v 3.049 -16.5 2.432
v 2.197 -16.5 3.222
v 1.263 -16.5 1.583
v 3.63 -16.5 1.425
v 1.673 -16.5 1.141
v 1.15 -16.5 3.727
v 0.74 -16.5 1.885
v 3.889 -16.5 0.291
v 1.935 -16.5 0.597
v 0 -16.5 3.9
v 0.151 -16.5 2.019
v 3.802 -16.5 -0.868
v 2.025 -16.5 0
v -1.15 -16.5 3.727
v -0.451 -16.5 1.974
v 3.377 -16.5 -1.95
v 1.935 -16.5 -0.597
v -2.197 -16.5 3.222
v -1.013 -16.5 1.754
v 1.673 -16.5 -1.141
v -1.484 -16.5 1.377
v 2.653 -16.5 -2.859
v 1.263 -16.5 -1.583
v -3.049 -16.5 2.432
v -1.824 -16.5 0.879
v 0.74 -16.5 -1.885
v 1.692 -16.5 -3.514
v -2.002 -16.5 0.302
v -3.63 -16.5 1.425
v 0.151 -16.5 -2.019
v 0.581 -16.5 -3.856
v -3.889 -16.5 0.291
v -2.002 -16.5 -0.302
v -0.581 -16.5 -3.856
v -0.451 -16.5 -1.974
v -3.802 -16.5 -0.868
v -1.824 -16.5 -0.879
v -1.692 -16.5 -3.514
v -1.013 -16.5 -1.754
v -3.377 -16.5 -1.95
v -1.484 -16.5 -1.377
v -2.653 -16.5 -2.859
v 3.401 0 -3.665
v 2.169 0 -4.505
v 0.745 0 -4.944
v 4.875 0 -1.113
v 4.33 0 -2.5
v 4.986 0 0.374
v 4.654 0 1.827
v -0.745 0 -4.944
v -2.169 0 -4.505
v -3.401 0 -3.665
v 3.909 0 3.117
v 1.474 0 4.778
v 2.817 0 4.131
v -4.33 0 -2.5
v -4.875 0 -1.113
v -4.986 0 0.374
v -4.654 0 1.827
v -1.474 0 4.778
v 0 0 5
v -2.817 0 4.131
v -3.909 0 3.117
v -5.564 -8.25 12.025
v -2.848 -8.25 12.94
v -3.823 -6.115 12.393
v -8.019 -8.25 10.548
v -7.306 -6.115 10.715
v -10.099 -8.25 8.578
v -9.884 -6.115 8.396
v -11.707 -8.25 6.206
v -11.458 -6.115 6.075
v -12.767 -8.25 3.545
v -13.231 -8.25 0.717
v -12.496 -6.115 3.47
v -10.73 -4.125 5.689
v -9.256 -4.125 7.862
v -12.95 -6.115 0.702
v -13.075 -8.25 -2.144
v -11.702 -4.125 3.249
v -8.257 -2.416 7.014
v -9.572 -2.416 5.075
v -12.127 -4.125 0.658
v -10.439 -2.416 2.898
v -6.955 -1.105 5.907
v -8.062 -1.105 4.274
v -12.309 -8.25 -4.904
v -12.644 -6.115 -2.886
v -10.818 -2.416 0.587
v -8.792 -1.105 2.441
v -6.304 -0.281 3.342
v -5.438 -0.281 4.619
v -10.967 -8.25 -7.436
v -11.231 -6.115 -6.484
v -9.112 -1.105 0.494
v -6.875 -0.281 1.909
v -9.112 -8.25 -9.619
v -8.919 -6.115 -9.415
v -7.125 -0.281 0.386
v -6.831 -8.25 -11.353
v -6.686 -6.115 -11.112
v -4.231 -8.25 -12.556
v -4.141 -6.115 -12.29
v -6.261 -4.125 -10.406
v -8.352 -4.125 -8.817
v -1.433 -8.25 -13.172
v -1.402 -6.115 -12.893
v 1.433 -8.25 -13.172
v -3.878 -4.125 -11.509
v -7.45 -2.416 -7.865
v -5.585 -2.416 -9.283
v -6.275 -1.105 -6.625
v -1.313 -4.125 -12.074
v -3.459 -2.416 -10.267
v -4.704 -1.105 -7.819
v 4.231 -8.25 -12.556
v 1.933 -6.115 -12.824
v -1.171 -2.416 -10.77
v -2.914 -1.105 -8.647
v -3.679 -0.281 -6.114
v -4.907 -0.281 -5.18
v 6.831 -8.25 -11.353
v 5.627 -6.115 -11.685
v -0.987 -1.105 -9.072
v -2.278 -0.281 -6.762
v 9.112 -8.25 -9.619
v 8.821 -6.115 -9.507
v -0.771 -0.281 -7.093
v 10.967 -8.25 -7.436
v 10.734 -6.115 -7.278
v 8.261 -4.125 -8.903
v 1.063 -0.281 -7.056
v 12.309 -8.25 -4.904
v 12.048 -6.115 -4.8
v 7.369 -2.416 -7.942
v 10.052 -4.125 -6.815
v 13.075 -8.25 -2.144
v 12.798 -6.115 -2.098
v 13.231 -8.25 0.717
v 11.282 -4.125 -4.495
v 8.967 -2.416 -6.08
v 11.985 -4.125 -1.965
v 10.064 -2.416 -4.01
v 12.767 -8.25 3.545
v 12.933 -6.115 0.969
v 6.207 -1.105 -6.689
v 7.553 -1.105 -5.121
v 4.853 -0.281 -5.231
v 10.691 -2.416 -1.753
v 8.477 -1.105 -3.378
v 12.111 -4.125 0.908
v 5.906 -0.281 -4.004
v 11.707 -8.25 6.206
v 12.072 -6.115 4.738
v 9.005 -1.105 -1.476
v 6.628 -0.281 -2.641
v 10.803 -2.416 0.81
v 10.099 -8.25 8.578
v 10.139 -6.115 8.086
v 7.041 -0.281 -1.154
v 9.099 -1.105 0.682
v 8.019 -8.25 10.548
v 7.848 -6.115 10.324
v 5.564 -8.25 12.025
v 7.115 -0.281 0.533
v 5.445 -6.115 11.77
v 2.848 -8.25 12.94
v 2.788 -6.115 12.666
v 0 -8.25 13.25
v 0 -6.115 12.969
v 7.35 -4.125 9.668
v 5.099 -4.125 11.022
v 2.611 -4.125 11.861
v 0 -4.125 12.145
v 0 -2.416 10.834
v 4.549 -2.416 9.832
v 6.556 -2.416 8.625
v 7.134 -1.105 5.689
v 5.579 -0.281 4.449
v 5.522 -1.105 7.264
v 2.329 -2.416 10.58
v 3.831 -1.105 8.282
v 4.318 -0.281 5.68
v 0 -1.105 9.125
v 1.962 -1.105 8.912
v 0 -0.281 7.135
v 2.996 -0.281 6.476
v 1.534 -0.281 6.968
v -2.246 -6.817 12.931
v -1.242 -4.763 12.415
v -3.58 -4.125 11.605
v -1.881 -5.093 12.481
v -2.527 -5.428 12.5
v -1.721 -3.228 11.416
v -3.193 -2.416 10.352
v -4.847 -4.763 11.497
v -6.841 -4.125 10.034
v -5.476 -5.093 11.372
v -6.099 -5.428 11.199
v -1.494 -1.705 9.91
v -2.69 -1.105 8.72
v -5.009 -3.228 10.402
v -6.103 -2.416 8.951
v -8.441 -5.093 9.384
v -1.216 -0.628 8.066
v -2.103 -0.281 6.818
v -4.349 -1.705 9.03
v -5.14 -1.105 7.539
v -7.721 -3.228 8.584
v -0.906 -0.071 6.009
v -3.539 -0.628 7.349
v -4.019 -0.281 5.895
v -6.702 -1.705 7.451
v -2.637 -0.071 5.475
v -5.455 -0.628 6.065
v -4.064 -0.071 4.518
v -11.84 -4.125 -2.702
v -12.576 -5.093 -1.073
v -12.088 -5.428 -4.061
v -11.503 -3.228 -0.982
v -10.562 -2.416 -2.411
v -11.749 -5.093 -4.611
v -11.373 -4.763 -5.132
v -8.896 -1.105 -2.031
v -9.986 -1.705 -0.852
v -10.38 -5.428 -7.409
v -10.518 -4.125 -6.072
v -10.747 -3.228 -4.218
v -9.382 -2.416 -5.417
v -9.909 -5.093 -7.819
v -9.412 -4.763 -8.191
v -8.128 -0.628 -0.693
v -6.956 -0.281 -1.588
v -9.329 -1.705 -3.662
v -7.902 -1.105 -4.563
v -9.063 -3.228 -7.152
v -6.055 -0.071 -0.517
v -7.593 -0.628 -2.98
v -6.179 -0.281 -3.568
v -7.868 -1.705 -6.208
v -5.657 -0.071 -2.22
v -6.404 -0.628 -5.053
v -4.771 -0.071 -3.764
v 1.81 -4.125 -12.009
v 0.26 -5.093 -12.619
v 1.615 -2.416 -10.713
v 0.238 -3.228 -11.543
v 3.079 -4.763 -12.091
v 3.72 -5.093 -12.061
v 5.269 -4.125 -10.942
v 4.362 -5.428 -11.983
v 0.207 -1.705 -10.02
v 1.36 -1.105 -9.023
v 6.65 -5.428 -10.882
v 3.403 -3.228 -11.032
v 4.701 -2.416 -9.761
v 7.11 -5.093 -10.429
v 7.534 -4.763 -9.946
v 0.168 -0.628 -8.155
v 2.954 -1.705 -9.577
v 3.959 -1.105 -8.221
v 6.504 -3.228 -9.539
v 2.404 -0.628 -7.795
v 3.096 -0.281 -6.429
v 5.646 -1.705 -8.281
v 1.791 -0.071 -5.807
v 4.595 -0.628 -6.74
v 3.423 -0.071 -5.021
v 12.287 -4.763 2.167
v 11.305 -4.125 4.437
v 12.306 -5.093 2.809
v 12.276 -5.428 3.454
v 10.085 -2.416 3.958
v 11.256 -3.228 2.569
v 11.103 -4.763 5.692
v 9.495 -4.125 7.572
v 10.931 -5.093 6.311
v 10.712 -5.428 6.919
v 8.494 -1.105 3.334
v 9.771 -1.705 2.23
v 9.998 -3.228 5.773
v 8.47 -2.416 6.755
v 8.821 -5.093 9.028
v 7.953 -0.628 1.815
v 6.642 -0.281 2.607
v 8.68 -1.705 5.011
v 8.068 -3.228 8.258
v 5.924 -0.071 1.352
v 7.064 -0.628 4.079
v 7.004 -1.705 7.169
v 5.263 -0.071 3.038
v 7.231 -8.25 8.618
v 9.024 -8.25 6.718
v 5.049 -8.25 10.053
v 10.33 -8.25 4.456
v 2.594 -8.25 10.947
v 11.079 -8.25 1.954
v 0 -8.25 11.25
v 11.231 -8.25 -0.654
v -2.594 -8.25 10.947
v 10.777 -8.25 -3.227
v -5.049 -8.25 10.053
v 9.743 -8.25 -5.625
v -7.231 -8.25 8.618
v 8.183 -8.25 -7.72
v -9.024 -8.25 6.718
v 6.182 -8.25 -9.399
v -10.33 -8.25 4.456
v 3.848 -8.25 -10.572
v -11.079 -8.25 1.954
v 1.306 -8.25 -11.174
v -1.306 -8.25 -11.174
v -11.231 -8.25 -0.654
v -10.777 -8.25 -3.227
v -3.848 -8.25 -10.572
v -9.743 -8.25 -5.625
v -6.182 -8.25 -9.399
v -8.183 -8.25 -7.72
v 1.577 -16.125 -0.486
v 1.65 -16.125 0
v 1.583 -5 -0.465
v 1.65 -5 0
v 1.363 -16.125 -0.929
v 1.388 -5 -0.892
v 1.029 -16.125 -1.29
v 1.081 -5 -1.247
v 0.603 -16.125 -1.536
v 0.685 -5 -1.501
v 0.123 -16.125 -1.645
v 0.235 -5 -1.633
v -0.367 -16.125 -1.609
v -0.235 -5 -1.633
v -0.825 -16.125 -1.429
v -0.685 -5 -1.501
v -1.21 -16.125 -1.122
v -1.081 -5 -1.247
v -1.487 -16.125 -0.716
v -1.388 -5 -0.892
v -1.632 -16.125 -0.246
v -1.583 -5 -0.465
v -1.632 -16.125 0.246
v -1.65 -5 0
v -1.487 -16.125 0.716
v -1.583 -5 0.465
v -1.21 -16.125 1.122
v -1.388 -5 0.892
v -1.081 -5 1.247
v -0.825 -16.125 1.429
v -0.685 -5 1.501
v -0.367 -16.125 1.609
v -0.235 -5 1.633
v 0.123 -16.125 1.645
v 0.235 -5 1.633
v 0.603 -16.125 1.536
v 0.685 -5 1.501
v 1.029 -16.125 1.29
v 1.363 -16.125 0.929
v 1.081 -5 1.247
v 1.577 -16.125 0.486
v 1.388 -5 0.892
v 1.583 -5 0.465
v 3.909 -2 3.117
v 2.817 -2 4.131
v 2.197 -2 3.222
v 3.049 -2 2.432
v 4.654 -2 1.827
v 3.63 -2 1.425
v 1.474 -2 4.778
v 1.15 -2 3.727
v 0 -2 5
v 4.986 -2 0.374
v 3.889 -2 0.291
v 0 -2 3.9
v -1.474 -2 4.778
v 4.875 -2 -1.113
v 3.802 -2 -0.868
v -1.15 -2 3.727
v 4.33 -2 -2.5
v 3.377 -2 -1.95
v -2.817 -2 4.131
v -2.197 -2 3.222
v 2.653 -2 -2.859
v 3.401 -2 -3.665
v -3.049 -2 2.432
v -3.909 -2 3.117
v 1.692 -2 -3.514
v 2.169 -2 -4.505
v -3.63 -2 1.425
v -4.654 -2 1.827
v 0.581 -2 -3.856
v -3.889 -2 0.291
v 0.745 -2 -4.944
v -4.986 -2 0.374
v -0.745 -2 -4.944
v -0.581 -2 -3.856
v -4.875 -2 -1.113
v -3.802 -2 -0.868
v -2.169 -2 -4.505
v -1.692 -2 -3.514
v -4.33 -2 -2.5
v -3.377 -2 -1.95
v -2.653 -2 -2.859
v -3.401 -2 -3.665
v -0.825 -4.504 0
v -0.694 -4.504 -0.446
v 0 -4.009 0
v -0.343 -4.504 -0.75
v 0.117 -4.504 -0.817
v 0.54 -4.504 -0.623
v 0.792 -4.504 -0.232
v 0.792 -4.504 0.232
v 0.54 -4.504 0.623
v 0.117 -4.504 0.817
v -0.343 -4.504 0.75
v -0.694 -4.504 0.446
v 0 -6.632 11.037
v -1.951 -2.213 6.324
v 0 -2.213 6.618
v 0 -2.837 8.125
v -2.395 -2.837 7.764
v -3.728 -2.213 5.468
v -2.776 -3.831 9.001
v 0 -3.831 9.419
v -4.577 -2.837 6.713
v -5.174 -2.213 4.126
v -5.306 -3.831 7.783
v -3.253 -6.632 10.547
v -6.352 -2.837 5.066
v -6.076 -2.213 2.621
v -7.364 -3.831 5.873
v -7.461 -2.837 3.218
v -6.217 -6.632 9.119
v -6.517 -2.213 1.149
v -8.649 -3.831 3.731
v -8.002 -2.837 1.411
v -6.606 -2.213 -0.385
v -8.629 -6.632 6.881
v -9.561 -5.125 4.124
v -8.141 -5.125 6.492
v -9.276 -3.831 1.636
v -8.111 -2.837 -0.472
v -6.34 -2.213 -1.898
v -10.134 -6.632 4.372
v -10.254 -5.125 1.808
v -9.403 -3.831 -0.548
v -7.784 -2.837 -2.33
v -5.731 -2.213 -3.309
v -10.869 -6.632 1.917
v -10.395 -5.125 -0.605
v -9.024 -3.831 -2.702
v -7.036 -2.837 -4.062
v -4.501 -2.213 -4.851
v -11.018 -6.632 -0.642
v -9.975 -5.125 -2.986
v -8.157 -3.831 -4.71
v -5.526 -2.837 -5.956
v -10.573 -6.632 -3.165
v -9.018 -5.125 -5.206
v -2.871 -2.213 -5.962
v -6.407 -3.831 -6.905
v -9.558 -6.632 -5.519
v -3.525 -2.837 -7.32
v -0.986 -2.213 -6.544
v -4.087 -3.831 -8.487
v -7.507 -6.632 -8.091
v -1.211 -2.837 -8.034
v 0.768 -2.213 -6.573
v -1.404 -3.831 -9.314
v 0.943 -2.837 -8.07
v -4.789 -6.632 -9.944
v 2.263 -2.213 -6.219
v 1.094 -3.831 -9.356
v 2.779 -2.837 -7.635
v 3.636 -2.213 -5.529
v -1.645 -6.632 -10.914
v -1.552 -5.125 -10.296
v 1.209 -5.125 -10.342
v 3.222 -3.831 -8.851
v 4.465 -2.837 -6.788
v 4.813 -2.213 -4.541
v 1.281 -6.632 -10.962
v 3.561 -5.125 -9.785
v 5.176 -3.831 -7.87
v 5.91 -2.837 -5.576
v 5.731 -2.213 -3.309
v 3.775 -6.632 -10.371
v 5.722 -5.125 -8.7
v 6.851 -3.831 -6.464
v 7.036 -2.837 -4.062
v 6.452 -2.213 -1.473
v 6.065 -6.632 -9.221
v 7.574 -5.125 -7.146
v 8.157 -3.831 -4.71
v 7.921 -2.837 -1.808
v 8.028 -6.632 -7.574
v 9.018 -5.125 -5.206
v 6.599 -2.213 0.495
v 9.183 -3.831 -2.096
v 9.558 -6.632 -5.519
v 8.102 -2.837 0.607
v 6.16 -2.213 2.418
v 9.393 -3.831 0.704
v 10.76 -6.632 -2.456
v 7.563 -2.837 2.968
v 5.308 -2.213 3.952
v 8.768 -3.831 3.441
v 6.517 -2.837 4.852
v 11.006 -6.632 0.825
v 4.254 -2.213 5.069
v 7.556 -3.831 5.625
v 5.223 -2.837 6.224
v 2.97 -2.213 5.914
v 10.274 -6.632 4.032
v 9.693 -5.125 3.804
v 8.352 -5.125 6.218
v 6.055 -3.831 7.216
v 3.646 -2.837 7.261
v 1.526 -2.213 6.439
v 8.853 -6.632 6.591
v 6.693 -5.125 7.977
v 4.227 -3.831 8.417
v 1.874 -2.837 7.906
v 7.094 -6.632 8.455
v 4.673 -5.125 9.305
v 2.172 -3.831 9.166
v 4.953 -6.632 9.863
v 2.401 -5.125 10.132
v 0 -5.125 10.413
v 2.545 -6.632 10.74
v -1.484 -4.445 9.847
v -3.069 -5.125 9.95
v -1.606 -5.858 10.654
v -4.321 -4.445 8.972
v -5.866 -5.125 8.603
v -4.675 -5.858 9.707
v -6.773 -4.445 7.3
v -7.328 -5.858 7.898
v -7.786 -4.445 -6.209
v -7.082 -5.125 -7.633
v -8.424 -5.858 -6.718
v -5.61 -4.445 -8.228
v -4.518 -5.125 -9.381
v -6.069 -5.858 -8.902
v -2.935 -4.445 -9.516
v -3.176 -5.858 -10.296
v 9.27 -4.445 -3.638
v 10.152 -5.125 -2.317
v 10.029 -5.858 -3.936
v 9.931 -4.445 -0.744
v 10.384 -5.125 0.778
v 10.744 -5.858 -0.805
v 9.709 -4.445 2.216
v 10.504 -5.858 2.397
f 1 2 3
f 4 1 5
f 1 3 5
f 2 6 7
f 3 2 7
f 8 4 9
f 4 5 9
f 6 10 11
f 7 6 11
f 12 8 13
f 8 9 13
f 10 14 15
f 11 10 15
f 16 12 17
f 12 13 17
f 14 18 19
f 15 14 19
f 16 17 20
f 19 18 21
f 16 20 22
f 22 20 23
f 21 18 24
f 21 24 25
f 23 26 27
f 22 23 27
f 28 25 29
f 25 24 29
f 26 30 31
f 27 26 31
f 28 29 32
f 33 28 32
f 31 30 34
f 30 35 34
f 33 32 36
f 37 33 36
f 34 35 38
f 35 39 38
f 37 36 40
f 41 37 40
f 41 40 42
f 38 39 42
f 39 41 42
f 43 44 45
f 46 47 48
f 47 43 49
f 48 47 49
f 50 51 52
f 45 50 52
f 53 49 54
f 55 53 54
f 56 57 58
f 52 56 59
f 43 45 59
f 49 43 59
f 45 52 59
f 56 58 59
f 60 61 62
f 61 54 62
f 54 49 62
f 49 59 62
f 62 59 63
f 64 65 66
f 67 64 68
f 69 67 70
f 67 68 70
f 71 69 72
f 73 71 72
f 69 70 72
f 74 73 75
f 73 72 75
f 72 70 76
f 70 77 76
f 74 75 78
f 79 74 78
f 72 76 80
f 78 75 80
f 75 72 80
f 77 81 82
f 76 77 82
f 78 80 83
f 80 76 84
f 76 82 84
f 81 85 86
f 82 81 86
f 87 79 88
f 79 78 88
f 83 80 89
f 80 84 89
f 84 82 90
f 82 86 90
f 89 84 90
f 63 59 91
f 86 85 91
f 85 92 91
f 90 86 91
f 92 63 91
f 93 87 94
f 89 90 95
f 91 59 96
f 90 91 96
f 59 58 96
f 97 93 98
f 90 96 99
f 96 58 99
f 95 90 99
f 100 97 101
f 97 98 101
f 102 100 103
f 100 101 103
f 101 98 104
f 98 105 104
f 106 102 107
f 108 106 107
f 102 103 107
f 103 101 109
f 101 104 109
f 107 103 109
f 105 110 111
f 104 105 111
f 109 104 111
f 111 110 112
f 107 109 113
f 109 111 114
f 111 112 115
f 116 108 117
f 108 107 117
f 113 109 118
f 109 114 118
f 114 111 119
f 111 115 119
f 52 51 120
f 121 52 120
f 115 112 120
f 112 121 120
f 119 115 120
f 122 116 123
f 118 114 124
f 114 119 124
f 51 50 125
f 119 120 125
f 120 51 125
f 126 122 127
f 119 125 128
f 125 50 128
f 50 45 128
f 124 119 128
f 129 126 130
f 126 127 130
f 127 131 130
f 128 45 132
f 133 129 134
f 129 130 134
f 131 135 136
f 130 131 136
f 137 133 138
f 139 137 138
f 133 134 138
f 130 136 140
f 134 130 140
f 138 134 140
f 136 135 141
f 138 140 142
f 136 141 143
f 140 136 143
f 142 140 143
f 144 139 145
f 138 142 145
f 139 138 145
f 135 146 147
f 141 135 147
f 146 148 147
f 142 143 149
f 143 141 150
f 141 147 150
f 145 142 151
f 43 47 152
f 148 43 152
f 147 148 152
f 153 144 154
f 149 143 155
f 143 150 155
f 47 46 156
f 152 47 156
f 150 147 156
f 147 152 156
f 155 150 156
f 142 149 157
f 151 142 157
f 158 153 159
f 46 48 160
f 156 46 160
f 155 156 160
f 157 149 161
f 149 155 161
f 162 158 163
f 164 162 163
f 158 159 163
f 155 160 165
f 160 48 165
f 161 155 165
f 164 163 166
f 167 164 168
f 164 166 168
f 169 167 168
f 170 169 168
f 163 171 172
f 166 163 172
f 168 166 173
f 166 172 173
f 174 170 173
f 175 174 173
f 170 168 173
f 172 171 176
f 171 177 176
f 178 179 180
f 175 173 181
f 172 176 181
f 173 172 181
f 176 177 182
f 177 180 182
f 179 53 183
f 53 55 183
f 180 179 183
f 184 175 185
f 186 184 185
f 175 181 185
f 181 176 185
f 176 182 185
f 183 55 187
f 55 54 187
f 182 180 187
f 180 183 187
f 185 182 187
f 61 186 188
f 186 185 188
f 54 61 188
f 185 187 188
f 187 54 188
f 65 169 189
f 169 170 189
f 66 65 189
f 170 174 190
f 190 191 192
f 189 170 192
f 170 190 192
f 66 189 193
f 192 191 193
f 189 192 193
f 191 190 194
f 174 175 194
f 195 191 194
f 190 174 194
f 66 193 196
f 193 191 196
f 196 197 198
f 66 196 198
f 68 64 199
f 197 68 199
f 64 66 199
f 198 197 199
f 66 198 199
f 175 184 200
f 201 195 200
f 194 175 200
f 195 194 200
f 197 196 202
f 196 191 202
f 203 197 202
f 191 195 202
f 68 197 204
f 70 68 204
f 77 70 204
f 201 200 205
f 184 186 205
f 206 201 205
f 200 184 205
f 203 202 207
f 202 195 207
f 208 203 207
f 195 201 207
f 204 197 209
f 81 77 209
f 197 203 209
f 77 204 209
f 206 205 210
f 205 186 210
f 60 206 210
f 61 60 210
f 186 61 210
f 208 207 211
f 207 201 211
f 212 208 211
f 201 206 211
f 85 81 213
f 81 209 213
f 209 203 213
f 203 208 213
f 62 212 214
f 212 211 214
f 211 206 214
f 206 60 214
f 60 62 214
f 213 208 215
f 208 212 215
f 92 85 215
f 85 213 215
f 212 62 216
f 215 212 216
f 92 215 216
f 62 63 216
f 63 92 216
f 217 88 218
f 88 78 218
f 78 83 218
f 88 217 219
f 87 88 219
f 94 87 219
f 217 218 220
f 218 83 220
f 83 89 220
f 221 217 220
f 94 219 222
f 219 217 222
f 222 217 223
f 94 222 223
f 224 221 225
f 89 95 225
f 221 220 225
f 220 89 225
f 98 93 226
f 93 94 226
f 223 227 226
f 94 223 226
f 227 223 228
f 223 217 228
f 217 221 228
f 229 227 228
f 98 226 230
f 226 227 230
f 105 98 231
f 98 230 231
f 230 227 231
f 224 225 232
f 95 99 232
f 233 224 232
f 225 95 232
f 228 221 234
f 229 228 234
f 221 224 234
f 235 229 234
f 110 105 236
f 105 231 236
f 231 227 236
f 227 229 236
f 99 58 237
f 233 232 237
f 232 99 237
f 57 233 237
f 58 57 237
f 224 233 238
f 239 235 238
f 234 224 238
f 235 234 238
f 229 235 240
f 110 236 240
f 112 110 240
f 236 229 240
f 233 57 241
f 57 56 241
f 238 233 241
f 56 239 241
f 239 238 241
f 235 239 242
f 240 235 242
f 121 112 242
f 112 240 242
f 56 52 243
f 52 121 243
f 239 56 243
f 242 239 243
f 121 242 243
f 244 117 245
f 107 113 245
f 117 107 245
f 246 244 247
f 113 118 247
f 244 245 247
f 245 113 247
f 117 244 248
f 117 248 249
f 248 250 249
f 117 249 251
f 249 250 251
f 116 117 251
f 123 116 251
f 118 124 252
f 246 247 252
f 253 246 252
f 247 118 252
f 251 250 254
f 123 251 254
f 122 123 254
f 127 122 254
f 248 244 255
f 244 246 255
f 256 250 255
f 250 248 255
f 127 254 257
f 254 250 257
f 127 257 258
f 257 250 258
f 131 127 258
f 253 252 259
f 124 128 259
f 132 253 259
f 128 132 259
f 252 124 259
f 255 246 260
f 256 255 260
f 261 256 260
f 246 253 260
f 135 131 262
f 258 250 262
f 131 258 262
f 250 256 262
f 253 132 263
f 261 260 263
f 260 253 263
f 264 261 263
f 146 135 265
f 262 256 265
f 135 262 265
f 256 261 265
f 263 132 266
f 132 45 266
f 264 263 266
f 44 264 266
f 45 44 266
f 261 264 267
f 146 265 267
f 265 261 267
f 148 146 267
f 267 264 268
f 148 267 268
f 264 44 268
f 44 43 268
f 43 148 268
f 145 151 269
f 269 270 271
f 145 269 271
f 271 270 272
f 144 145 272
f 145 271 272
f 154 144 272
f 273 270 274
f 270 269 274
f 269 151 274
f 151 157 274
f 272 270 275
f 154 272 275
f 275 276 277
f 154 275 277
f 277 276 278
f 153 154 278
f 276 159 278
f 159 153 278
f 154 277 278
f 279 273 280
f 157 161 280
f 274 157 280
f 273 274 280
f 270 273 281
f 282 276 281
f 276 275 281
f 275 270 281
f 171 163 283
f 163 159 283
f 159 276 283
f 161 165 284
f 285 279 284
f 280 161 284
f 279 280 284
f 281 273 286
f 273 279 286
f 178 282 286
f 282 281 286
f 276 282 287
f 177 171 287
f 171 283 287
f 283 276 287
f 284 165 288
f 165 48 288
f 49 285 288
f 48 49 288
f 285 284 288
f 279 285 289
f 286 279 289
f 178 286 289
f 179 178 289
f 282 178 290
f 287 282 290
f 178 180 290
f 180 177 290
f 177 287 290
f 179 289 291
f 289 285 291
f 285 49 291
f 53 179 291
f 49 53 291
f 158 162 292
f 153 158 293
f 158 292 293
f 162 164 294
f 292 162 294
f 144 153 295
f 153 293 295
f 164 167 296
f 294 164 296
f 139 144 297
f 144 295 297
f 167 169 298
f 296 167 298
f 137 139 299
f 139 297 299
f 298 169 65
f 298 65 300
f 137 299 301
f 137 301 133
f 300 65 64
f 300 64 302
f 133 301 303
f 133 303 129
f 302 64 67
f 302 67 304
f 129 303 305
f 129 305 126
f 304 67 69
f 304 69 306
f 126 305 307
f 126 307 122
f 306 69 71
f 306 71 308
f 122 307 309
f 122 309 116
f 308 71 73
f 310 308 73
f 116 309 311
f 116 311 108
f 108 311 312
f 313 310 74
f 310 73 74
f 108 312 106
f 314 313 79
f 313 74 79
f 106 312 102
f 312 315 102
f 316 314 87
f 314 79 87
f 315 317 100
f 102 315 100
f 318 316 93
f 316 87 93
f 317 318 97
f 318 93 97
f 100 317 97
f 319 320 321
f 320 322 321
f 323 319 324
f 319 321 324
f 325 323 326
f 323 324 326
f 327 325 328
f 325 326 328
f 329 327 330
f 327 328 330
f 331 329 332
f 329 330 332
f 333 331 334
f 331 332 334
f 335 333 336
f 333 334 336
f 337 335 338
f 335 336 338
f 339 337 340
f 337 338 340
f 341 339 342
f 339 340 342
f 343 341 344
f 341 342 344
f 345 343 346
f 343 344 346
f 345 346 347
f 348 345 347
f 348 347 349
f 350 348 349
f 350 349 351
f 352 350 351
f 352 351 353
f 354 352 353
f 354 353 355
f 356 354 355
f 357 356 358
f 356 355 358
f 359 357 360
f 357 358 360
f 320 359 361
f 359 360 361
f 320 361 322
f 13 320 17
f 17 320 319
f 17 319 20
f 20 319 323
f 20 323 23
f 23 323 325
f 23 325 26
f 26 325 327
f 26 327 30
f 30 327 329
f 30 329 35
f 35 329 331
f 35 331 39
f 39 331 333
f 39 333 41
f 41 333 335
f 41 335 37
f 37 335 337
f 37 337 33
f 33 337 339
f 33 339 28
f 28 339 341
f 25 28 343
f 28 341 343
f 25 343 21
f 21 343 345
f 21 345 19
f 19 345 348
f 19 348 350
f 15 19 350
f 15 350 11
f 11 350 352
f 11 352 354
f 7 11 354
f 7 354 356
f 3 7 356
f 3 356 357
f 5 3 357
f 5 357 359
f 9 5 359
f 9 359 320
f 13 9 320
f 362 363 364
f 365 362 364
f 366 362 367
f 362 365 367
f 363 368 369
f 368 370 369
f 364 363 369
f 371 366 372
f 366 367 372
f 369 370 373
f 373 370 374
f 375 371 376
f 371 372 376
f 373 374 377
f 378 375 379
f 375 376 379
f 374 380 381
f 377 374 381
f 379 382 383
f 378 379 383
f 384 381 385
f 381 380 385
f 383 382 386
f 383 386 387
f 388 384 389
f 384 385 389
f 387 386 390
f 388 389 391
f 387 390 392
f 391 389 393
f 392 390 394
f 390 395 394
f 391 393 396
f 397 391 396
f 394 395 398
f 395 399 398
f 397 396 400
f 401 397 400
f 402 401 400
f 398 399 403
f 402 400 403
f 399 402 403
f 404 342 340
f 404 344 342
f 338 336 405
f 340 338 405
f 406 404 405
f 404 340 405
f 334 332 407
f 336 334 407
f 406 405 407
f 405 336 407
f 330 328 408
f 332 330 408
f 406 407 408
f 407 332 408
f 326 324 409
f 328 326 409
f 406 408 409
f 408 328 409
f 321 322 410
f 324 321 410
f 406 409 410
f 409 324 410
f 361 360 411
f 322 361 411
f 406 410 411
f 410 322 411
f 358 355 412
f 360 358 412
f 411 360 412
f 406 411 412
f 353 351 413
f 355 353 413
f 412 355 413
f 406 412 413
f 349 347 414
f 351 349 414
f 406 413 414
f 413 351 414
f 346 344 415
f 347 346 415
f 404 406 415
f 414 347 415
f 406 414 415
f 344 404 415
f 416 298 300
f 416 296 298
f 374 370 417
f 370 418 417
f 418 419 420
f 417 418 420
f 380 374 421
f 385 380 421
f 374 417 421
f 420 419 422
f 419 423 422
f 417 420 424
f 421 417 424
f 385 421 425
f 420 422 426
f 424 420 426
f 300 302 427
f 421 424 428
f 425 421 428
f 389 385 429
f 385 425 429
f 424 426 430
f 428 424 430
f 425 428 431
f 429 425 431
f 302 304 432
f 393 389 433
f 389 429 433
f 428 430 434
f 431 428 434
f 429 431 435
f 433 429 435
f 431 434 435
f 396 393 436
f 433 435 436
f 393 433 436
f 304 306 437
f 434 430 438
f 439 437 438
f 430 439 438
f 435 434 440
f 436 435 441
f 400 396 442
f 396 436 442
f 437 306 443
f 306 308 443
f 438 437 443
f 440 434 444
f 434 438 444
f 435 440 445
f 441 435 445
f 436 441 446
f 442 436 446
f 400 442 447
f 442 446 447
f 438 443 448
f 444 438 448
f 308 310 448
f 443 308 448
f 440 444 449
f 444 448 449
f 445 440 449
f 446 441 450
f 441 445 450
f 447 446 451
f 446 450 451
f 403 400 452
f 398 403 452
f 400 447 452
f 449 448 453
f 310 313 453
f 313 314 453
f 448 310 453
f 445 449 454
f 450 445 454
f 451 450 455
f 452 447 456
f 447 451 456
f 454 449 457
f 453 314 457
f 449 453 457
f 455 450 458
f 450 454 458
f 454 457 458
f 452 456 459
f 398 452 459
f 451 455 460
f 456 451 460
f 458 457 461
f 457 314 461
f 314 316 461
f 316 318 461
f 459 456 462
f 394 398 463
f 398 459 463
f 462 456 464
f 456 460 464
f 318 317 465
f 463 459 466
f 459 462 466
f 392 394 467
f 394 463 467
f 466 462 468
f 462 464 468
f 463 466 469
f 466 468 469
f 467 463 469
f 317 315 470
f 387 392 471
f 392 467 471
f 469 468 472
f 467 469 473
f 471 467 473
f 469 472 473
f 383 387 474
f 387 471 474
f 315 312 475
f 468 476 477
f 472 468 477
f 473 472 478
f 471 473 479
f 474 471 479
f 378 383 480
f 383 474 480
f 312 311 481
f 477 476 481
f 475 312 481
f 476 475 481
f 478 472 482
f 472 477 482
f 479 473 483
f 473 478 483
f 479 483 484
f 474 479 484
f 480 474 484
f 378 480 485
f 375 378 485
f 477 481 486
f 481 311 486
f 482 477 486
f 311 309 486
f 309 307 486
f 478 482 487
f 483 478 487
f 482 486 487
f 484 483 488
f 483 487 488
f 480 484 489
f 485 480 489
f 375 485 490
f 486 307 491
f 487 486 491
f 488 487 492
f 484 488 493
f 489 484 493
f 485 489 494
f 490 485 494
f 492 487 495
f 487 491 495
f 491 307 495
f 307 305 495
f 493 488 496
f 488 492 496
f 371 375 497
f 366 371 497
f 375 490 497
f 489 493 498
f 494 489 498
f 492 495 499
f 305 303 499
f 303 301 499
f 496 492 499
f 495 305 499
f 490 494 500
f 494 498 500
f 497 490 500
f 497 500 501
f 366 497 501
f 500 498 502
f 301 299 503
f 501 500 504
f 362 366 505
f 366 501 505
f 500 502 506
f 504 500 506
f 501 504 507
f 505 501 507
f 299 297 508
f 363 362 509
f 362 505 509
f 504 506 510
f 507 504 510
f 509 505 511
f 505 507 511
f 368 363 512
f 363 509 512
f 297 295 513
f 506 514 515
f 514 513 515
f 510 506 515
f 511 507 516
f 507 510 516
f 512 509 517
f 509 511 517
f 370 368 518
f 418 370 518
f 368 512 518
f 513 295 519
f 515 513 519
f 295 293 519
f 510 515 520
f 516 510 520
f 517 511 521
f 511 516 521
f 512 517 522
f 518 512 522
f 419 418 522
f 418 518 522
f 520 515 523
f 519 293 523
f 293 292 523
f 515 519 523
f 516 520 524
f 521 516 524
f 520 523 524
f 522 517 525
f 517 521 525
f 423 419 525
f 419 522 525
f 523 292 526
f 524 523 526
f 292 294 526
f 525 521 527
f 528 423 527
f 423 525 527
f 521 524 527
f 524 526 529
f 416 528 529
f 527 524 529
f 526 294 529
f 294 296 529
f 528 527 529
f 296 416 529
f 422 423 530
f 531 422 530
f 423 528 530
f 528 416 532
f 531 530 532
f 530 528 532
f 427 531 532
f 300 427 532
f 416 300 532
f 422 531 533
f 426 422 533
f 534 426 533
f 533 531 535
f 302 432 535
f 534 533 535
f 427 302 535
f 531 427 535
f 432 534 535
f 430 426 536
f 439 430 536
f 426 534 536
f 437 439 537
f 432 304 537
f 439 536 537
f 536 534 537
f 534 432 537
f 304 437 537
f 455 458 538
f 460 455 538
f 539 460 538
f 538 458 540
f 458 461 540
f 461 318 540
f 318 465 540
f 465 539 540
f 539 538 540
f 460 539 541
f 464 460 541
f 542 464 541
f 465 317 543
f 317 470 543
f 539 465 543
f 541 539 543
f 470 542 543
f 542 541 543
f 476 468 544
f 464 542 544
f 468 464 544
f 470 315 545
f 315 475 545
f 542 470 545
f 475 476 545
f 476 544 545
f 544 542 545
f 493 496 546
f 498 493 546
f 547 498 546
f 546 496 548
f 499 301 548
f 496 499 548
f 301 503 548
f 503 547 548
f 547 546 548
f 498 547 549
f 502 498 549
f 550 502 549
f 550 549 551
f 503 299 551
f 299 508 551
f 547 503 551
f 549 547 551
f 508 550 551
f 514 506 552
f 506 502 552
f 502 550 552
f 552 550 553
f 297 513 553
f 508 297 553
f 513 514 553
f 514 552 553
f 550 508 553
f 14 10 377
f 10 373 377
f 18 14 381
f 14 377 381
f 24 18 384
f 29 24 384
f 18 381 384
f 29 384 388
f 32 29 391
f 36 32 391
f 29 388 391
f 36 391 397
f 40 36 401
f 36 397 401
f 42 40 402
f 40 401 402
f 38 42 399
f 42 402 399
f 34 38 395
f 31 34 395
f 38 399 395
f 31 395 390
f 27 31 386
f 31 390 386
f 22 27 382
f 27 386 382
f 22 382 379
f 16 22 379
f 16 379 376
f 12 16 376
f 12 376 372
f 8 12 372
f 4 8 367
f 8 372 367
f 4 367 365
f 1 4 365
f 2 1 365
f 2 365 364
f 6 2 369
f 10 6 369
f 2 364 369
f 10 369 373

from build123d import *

# Parameters (mm, degrees)
FURO_ROSCADO_DE_M41_D           = 3.3
FURO_ROSCADO_DE_M41_DEPTH       = 11.5
FURO_ROSCADO_DE_M41_CSINK_D     = 4.05
FURO_ROSCADO_DE_M41_CSINK_ANGLE = 90
FURO_ROSCADO_DE_M41_TIP         = 0.991420021


with BuildPart() as part:
    # Esboço1 → Revolução1 (revolve)
    with BuildSketch(Plane.XY, mode=Mode.PRIVATE) as revolu_o1_sk:
        with BuildLine():
            Line((0, 0), (0, -16.5))
            Line((0, -16.5), (3.9, -16.5))
            Line((3.9, -16.5), (3.9, -2))
            Line((3.9, -2), (5, -2))
            ThreePointArc((5, -2), (9.419417382, -3.830582618), (11.25, -8.25))
            Line((11.25, -8.25), (13.25, -8.25))
            ThreePointArc((13.25, -8.25), (10.833630945, -2.416369055), (5, 0))
            Line((5, 0), (0, 0))
        make_face()
    revolve(revolu_o1_sk.sketch.rotate(Axis((0, 0, 0), (0, -1, 0)), 90), axis=Axis((0, 0, 0), (0, -1, 0)))

    # Furo roscado de M41
    with Locations(Plane(origin=(0, -16.5, 0), x_dir=(-1, 0, 0), z_dir=(0, -1, 0))):
        with Locations((0, 0)):
            CounterSinkHole(FURO_ROSCADO_DE_M41_D / 2, FURO_ROSCADO_DE_M41_CSINK_D / 2, depth=FURO_ROSCADO_DE_M41_DEPTH, counter_sink_angle=FURO_ROSCADO_DE_M41_CSINK_ANGLE)
            with Locations((0, 0, -(FURO_ROSCADO_DE_M41_DEPTH + FURO_ROSCADO_DE_M41_TIP / 2))):  # 118° drill point
                Cone(0, FURO_ROSCADO_DE_M41_D / 2, FURO_ROSCADO_DE_M41_TIP, mode=Mode.SUBTRACT)


solid = part.part
